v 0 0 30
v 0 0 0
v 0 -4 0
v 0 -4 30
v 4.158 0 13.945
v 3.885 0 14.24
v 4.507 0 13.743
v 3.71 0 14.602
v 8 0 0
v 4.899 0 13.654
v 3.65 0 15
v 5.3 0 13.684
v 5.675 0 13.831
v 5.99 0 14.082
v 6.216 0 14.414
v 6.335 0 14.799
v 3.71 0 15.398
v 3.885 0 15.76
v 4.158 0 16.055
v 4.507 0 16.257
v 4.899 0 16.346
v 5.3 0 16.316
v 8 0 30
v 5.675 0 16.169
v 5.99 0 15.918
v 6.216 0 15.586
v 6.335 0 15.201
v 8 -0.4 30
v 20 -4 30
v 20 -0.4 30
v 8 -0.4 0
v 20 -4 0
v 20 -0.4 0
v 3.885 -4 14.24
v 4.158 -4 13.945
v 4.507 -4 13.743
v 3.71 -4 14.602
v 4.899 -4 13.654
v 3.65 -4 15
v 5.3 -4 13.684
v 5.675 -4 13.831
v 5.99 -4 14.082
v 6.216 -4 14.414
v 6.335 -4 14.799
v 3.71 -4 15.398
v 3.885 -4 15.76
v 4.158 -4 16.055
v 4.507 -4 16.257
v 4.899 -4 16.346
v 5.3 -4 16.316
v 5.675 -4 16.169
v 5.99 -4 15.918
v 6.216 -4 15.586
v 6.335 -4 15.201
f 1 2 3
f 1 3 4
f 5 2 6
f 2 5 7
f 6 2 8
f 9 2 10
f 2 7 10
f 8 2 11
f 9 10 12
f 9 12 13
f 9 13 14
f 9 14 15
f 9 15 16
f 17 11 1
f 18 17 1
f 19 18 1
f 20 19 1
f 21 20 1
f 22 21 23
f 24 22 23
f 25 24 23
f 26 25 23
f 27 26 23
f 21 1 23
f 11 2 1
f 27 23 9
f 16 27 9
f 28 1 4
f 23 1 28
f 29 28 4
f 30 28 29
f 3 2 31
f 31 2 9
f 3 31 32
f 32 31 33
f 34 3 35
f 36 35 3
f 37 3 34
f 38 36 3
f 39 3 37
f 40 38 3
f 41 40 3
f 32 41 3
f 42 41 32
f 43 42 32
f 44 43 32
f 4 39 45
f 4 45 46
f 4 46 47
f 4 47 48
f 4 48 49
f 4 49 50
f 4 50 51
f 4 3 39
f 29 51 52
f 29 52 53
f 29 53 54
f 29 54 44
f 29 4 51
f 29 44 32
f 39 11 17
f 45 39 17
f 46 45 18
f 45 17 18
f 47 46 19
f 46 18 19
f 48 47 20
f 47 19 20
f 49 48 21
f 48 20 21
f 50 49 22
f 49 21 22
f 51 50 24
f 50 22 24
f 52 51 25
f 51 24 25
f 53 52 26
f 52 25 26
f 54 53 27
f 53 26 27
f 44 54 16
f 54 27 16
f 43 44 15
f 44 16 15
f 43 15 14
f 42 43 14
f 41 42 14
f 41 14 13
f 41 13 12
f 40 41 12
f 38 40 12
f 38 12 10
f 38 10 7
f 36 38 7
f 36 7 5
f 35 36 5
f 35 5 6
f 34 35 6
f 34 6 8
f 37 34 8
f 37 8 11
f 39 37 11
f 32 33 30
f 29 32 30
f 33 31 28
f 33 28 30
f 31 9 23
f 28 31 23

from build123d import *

# Parameters (mm, degrees)
F0_W     = 20
F0_H     = 30
F1_DEPTH = 4
F2_W     = 12
F2_H     = 30
F3_DEPTH = 0.4
F5_D     = 2.7


with BuildPart() as f1:
    # F0 (on Front) → F1 (new body)
    with BuildSketch(Plane.XZ):
        with Locations((10, 15)):
            Rectangle(F0_W, F0_H)
    extrude(amount=F1_DEPTH)

    # F2 (on Front) → F3 (cut)
    with BuildSketch(Plane.XZ):
        with Locations((14, 15)):
            Rectangle(F2_W, F2_H)
    extrude(amount=F3_DEPTH, mode=Mode.SUBTRACT)

    # F5 (through all)
    with Locations(Plane.XZ.offset(4)):
        with Locations((5, 15)):
            Hole(F5_D / 2)


solid = f1.part
